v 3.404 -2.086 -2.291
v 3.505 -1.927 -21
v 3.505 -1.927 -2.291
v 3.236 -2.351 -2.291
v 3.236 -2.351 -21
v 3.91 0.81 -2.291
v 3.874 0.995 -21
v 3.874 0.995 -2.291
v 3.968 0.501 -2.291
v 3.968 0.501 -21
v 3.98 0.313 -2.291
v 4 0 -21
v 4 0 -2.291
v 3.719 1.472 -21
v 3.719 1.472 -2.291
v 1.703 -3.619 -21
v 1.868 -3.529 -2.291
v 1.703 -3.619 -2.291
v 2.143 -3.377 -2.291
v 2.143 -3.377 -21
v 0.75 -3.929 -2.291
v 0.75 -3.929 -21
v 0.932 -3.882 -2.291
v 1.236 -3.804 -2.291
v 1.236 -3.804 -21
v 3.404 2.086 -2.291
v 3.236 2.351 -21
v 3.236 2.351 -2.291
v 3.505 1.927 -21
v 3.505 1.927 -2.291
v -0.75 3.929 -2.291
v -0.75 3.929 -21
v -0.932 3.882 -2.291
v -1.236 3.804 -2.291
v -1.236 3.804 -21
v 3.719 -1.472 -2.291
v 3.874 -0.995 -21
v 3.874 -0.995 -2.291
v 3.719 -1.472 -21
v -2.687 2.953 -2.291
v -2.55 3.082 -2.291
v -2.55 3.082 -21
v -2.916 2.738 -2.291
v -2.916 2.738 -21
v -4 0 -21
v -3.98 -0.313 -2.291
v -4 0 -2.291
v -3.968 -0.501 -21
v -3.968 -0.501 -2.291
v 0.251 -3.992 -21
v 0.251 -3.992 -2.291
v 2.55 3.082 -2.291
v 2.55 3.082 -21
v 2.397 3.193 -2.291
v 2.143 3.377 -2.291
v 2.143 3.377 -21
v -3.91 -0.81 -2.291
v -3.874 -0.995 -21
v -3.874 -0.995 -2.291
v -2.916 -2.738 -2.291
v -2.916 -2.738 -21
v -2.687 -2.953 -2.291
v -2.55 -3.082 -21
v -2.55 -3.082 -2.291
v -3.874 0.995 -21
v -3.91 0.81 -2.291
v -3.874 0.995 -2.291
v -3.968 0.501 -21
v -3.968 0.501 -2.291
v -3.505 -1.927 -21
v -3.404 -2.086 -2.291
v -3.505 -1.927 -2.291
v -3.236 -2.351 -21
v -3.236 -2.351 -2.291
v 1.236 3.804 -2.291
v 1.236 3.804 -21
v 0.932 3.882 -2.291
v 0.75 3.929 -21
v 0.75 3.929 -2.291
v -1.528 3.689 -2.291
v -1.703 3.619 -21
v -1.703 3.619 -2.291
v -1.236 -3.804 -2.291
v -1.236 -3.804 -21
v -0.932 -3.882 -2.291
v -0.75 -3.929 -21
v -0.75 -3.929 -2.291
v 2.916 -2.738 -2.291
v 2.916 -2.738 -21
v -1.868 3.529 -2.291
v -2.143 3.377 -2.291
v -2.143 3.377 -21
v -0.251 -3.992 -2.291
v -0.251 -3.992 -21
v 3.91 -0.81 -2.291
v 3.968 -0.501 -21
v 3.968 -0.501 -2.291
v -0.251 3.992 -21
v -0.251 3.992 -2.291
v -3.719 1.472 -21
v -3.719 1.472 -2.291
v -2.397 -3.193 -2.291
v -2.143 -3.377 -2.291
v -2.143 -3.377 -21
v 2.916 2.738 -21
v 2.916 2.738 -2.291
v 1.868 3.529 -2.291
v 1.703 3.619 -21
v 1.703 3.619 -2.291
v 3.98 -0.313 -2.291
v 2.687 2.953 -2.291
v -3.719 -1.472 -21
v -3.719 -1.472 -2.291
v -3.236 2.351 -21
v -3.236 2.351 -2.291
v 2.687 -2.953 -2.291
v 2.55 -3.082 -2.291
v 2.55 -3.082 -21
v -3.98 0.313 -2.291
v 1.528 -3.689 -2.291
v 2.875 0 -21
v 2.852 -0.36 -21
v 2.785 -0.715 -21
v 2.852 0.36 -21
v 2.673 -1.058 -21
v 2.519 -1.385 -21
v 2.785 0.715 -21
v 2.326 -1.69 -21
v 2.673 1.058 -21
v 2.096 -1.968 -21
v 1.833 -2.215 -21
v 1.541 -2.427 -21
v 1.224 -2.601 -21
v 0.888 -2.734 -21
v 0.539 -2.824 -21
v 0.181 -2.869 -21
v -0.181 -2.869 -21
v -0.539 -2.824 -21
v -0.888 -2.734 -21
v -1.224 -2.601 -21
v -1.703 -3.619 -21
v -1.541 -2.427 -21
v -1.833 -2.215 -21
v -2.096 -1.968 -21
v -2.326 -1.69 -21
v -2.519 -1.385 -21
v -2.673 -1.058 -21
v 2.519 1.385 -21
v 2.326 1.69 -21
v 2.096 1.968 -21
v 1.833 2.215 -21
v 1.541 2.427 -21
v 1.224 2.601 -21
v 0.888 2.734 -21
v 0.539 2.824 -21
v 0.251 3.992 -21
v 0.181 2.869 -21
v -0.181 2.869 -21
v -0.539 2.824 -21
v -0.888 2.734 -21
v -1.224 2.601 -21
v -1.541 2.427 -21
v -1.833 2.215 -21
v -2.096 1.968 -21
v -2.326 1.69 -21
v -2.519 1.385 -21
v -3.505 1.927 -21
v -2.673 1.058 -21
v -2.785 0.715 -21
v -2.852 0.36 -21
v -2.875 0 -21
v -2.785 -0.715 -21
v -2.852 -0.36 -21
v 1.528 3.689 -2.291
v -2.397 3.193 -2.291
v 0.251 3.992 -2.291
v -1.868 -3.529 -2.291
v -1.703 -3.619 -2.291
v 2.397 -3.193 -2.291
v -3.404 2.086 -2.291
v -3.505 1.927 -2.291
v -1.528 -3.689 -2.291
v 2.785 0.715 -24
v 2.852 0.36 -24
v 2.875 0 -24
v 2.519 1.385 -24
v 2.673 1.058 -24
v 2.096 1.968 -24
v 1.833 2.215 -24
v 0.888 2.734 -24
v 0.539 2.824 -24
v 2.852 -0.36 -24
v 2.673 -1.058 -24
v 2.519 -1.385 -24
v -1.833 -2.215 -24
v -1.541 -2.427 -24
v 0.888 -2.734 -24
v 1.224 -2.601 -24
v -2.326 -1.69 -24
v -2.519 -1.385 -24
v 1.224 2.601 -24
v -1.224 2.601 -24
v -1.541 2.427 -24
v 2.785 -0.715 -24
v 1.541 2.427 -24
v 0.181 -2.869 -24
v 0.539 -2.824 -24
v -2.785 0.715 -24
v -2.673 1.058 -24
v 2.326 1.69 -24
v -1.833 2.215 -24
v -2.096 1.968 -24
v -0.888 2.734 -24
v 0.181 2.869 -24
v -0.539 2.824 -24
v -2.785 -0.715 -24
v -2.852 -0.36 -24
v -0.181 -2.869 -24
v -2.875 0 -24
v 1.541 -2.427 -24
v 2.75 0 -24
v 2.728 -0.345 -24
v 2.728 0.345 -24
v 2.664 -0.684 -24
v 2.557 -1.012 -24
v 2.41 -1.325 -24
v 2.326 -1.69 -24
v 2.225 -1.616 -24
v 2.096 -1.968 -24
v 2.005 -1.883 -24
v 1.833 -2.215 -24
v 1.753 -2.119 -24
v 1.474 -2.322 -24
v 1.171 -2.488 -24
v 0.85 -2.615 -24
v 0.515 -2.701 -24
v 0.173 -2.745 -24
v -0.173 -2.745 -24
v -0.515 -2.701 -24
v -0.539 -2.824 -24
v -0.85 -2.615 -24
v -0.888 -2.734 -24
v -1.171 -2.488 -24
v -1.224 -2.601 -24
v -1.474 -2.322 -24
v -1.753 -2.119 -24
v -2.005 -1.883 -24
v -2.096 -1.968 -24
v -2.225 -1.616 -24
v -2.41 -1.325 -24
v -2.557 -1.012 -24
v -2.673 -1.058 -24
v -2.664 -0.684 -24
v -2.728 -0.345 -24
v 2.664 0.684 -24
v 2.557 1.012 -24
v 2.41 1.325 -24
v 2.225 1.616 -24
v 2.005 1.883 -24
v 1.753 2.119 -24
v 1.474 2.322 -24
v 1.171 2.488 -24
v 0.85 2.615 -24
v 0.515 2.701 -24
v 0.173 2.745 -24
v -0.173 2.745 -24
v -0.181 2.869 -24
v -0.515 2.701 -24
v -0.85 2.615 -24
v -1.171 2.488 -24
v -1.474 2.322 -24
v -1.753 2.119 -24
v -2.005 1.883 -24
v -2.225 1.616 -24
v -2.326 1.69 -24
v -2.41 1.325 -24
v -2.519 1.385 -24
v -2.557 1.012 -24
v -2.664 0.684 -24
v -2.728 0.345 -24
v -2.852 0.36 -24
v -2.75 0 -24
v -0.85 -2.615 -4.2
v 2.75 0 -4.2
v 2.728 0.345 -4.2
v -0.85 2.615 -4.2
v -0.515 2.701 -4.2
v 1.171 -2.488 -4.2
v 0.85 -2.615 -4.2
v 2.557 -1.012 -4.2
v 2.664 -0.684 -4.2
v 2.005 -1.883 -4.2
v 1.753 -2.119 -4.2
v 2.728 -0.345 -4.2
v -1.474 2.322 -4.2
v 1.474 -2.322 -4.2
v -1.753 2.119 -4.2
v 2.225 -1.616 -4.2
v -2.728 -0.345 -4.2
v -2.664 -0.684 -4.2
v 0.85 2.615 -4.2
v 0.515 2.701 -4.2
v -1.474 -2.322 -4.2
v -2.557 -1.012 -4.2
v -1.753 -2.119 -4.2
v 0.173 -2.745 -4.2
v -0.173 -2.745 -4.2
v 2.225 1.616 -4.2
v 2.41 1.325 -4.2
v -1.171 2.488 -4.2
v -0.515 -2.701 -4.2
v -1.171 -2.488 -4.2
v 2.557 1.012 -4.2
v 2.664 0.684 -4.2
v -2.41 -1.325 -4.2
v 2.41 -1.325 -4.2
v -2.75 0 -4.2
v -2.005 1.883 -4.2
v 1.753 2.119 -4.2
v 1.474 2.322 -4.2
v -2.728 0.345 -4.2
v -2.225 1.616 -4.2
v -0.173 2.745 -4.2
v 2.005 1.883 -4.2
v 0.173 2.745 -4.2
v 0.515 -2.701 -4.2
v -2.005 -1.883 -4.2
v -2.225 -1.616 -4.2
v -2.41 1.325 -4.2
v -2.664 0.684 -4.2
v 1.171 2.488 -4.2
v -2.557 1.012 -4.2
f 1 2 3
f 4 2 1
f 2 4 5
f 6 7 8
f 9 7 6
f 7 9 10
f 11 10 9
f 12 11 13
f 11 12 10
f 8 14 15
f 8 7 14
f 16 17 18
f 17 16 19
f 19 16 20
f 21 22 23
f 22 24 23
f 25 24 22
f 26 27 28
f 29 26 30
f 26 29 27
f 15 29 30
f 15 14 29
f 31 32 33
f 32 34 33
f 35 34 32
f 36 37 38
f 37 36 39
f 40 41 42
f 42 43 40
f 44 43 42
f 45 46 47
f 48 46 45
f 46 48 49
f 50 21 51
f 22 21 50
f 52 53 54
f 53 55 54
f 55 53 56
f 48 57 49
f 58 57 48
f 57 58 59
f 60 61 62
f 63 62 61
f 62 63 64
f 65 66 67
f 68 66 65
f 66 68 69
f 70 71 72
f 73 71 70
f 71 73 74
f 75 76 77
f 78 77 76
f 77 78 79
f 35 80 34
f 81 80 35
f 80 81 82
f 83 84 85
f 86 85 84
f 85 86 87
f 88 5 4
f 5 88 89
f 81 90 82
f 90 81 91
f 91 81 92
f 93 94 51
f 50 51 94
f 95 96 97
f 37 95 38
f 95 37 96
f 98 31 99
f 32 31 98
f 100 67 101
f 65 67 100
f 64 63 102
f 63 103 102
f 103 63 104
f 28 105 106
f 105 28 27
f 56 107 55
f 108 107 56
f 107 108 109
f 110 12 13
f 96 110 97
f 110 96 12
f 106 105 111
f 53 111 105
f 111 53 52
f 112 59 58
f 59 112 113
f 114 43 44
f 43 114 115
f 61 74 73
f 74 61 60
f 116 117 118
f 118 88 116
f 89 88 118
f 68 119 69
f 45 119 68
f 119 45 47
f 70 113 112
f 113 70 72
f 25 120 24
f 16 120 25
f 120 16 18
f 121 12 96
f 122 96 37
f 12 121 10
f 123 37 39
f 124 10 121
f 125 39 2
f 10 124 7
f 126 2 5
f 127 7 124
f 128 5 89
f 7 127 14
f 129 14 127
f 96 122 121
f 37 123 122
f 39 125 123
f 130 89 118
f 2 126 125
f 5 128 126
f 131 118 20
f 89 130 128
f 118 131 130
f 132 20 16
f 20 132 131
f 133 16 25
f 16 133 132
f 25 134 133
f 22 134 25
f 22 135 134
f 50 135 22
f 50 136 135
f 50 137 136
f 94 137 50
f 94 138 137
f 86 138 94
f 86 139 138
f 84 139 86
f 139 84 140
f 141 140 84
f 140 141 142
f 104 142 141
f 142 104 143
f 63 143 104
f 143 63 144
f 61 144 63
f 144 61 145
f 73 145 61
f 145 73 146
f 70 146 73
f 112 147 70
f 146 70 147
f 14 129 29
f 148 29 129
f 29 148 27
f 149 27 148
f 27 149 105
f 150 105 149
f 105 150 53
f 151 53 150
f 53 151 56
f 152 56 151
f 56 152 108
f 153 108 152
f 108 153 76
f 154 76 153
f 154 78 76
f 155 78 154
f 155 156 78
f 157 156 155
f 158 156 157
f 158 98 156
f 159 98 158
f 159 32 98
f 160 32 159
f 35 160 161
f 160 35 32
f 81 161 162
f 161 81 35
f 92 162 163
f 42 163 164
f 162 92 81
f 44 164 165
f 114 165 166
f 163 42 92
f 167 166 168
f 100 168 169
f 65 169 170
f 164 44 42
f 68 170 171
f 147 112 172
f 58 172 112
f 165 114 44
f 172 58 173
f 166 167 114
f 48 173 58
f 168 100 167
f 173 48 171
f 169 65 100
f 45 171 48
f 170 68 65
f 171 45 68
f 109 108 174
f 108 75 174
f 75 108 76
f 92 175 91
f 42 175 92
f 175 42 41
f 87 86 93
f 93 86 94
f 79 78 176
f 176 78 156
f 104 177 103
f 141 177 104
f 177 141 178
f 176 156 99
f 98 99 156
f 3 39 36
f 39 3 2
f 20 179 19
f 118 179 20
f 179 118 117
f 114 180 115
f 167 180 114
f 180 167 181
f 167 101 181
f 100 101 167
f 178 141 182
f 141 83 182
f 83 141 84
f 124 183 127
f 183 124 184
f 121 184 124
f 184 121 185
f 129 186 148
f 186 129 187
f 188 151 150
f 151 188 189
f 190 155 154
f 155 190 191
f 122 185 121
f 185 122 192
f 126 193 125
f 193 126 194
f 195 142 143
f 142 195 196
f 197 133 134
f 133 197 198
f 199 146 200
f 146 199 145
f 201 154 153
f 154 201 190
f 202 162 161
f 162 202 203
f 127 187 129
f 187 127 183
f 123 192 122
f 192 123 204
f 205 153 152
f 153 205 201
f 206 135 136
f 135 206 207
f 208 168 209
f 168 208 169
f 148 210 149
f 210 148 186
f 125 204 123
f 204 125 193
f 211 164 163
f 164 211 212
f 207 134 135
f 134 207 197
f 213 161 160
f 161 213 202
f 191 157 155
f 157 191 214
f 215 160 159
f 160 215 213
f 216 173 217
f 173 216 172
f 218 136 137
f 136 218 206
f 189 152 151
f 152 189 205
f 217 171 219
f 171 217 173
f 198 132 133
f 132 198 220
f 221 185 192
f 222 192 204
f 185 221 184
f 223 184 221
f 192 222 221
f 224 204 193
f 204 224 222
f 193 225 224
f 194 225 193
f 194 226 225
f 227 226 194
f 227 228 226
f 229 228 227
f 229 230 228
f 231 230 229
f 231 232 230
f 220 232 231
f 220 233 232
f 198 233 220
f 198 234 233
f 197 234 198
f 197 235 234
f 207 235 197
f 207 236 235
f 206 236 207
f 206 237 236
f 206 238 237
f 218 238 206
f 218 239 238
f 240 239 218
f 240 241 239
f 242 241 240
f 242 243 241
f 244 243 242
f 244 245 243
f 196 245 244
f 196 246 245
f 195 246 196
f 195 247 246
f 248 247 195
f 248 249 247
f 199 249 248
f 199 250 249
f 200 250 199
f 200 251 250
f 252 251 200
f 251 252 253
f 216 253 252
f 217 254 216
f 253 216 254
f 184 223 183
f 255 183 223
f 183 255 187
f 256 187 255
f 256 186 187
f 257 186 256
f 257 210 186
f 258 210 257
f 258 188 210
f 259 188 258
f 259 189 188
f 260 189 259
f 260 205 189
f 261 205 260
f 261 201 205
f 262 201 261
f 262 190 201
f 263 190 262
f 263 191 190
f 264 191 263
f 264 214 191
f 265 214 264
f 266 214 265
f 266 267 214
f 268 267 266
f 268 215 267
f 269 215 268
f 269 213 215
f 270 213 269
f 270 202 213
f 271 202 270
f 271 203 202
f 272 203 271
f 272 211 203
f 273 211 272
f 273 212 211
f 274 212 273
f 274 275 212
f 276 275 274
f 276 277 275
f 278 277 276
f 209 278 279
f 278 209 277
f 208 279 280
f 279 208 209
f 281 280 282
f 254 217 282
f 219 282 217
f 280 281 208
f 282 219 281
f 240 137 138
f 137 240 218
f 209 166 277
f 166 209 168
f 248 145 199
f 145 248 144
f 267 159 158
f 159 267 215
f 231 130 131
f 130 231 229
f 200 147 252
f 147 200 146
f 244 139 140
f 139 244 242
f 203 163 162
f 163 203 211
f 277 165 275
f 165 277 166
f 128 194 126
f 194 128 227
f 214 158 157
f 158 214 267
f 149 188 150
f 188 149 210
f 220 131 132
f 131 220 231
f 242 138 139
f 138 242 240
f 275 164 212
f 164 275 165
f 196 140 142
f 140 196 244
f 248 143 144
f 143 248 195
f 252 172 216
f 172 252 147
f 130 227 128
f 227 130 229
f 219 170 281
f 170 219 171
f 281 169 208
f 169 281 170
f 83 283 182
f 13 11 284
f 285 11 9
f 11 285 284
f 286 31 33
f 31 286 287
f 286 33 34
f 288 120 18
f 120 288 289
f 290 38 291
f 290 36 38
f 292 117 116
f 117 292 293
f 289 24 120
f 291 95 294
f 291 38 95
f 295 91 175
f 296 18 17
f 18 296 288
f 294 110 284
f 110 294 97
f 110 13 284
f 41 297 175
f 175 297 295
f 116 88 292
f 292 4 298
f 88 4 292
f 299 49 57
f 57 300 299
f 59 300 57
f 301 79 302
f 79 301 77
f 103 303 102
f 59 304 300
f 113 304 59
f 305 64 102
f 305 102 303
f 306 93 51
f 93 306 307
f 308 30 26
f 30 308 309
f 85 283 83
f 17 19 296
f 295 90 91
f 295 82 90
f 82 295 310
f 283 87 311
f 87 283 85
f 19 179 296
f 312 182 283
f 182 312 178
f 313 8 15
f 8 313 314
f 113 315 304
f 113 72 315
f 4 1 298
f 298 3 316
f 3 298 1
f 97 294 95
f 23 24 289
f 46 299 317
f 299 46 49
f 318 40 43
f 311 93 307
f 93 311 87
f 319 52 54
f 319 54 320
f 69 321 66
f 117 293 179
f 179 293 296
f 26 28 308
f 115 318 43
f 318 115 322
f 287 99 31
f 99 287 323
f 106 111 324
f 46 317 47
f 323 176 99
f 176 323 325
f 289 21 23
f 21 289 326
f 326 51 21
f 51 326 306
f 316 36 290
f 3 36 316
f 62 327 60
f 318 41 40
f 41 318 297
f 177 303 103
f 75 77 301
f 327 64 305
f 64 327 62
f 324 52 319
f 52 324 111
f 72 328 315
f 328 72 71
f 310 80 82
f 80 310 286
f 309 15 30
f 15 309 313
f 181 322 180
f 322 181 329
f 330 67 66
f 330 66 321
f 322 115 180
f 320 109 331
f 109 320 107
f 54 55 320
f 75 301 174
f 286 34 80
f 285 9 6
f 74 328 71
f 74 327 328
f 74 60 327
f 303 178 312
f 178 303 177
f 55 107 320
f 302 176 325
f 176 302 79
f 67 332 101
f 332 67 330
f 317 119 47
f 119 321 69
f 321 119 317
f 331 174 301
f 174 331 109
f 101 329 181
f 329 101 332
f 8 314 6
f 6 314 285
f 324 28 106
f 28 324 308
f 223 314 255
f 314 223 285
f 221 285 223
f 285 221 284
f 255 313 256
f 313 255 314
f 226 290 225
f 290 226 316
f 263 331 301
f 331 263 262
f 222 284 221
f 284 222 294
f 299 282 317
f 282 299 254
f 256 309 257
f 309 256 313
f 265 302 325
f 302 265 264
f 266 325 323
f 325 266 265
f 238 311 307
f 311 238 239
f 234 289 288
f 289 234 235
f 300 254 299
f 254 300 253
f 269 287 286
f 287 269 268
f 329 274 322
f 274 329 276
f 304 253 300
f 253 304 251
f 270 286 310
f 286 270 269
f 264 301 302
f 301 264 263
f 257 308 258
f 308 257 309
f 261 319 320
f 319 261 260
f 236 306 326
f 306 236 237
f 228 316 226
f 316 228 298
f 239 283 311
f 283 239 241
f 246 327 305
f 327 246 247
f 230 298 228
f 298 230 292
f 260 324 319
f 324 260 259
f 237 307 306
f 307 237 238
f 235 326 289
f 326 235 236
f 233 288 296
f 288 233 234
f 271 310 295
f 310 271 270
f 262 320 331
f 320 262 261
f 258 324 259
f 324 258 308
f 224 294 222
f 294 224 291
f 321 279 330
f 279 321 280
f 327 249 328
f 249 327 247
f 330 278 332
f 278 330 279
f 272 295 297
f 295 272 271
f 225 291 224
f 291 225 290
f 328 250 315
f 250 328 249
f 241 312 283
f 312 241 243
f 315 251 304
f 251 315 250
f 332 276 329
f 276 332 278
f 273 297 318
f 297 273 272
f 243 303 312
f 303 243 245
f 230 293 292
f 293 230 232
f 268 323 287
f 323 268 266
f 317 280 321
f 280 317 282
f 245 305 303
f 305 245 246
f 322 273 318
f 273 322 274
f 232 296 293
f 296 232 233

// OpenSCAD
$fn = 50;

difference() {
	union() {
		translate(v = [0, 0, -21.0]) {
			cylinder(h = 21, r = 4.0);
		}
		#translate(v = [0, 0, -24.0]) {
			cylinder(h = 24, r = 2.875);
		}
	}
	union() {
		translate(v = [0, 0, 0]) {
			rotate(a = [0, 0, 0]) {
				difference() {
					union() {
						translate(v = [0, 0, -24.0]) {
							cylinder(h = 24, r = 2.25);
						}
						translate(v = [0, 0, -4.2]) {
							cylinder(h = 4.2, r1 = 2.75, r2 = 5.5);
						}
						translate(v = [0, 0, -24.0]) {
							cylinder(h = 24, r = 2.75);
						}
						translate(v = [0, 0, -24.0]) {
							cylinder(h = 24, r = 2.25);
						}
					}
					union();
				}
			}
		}
	}
}
